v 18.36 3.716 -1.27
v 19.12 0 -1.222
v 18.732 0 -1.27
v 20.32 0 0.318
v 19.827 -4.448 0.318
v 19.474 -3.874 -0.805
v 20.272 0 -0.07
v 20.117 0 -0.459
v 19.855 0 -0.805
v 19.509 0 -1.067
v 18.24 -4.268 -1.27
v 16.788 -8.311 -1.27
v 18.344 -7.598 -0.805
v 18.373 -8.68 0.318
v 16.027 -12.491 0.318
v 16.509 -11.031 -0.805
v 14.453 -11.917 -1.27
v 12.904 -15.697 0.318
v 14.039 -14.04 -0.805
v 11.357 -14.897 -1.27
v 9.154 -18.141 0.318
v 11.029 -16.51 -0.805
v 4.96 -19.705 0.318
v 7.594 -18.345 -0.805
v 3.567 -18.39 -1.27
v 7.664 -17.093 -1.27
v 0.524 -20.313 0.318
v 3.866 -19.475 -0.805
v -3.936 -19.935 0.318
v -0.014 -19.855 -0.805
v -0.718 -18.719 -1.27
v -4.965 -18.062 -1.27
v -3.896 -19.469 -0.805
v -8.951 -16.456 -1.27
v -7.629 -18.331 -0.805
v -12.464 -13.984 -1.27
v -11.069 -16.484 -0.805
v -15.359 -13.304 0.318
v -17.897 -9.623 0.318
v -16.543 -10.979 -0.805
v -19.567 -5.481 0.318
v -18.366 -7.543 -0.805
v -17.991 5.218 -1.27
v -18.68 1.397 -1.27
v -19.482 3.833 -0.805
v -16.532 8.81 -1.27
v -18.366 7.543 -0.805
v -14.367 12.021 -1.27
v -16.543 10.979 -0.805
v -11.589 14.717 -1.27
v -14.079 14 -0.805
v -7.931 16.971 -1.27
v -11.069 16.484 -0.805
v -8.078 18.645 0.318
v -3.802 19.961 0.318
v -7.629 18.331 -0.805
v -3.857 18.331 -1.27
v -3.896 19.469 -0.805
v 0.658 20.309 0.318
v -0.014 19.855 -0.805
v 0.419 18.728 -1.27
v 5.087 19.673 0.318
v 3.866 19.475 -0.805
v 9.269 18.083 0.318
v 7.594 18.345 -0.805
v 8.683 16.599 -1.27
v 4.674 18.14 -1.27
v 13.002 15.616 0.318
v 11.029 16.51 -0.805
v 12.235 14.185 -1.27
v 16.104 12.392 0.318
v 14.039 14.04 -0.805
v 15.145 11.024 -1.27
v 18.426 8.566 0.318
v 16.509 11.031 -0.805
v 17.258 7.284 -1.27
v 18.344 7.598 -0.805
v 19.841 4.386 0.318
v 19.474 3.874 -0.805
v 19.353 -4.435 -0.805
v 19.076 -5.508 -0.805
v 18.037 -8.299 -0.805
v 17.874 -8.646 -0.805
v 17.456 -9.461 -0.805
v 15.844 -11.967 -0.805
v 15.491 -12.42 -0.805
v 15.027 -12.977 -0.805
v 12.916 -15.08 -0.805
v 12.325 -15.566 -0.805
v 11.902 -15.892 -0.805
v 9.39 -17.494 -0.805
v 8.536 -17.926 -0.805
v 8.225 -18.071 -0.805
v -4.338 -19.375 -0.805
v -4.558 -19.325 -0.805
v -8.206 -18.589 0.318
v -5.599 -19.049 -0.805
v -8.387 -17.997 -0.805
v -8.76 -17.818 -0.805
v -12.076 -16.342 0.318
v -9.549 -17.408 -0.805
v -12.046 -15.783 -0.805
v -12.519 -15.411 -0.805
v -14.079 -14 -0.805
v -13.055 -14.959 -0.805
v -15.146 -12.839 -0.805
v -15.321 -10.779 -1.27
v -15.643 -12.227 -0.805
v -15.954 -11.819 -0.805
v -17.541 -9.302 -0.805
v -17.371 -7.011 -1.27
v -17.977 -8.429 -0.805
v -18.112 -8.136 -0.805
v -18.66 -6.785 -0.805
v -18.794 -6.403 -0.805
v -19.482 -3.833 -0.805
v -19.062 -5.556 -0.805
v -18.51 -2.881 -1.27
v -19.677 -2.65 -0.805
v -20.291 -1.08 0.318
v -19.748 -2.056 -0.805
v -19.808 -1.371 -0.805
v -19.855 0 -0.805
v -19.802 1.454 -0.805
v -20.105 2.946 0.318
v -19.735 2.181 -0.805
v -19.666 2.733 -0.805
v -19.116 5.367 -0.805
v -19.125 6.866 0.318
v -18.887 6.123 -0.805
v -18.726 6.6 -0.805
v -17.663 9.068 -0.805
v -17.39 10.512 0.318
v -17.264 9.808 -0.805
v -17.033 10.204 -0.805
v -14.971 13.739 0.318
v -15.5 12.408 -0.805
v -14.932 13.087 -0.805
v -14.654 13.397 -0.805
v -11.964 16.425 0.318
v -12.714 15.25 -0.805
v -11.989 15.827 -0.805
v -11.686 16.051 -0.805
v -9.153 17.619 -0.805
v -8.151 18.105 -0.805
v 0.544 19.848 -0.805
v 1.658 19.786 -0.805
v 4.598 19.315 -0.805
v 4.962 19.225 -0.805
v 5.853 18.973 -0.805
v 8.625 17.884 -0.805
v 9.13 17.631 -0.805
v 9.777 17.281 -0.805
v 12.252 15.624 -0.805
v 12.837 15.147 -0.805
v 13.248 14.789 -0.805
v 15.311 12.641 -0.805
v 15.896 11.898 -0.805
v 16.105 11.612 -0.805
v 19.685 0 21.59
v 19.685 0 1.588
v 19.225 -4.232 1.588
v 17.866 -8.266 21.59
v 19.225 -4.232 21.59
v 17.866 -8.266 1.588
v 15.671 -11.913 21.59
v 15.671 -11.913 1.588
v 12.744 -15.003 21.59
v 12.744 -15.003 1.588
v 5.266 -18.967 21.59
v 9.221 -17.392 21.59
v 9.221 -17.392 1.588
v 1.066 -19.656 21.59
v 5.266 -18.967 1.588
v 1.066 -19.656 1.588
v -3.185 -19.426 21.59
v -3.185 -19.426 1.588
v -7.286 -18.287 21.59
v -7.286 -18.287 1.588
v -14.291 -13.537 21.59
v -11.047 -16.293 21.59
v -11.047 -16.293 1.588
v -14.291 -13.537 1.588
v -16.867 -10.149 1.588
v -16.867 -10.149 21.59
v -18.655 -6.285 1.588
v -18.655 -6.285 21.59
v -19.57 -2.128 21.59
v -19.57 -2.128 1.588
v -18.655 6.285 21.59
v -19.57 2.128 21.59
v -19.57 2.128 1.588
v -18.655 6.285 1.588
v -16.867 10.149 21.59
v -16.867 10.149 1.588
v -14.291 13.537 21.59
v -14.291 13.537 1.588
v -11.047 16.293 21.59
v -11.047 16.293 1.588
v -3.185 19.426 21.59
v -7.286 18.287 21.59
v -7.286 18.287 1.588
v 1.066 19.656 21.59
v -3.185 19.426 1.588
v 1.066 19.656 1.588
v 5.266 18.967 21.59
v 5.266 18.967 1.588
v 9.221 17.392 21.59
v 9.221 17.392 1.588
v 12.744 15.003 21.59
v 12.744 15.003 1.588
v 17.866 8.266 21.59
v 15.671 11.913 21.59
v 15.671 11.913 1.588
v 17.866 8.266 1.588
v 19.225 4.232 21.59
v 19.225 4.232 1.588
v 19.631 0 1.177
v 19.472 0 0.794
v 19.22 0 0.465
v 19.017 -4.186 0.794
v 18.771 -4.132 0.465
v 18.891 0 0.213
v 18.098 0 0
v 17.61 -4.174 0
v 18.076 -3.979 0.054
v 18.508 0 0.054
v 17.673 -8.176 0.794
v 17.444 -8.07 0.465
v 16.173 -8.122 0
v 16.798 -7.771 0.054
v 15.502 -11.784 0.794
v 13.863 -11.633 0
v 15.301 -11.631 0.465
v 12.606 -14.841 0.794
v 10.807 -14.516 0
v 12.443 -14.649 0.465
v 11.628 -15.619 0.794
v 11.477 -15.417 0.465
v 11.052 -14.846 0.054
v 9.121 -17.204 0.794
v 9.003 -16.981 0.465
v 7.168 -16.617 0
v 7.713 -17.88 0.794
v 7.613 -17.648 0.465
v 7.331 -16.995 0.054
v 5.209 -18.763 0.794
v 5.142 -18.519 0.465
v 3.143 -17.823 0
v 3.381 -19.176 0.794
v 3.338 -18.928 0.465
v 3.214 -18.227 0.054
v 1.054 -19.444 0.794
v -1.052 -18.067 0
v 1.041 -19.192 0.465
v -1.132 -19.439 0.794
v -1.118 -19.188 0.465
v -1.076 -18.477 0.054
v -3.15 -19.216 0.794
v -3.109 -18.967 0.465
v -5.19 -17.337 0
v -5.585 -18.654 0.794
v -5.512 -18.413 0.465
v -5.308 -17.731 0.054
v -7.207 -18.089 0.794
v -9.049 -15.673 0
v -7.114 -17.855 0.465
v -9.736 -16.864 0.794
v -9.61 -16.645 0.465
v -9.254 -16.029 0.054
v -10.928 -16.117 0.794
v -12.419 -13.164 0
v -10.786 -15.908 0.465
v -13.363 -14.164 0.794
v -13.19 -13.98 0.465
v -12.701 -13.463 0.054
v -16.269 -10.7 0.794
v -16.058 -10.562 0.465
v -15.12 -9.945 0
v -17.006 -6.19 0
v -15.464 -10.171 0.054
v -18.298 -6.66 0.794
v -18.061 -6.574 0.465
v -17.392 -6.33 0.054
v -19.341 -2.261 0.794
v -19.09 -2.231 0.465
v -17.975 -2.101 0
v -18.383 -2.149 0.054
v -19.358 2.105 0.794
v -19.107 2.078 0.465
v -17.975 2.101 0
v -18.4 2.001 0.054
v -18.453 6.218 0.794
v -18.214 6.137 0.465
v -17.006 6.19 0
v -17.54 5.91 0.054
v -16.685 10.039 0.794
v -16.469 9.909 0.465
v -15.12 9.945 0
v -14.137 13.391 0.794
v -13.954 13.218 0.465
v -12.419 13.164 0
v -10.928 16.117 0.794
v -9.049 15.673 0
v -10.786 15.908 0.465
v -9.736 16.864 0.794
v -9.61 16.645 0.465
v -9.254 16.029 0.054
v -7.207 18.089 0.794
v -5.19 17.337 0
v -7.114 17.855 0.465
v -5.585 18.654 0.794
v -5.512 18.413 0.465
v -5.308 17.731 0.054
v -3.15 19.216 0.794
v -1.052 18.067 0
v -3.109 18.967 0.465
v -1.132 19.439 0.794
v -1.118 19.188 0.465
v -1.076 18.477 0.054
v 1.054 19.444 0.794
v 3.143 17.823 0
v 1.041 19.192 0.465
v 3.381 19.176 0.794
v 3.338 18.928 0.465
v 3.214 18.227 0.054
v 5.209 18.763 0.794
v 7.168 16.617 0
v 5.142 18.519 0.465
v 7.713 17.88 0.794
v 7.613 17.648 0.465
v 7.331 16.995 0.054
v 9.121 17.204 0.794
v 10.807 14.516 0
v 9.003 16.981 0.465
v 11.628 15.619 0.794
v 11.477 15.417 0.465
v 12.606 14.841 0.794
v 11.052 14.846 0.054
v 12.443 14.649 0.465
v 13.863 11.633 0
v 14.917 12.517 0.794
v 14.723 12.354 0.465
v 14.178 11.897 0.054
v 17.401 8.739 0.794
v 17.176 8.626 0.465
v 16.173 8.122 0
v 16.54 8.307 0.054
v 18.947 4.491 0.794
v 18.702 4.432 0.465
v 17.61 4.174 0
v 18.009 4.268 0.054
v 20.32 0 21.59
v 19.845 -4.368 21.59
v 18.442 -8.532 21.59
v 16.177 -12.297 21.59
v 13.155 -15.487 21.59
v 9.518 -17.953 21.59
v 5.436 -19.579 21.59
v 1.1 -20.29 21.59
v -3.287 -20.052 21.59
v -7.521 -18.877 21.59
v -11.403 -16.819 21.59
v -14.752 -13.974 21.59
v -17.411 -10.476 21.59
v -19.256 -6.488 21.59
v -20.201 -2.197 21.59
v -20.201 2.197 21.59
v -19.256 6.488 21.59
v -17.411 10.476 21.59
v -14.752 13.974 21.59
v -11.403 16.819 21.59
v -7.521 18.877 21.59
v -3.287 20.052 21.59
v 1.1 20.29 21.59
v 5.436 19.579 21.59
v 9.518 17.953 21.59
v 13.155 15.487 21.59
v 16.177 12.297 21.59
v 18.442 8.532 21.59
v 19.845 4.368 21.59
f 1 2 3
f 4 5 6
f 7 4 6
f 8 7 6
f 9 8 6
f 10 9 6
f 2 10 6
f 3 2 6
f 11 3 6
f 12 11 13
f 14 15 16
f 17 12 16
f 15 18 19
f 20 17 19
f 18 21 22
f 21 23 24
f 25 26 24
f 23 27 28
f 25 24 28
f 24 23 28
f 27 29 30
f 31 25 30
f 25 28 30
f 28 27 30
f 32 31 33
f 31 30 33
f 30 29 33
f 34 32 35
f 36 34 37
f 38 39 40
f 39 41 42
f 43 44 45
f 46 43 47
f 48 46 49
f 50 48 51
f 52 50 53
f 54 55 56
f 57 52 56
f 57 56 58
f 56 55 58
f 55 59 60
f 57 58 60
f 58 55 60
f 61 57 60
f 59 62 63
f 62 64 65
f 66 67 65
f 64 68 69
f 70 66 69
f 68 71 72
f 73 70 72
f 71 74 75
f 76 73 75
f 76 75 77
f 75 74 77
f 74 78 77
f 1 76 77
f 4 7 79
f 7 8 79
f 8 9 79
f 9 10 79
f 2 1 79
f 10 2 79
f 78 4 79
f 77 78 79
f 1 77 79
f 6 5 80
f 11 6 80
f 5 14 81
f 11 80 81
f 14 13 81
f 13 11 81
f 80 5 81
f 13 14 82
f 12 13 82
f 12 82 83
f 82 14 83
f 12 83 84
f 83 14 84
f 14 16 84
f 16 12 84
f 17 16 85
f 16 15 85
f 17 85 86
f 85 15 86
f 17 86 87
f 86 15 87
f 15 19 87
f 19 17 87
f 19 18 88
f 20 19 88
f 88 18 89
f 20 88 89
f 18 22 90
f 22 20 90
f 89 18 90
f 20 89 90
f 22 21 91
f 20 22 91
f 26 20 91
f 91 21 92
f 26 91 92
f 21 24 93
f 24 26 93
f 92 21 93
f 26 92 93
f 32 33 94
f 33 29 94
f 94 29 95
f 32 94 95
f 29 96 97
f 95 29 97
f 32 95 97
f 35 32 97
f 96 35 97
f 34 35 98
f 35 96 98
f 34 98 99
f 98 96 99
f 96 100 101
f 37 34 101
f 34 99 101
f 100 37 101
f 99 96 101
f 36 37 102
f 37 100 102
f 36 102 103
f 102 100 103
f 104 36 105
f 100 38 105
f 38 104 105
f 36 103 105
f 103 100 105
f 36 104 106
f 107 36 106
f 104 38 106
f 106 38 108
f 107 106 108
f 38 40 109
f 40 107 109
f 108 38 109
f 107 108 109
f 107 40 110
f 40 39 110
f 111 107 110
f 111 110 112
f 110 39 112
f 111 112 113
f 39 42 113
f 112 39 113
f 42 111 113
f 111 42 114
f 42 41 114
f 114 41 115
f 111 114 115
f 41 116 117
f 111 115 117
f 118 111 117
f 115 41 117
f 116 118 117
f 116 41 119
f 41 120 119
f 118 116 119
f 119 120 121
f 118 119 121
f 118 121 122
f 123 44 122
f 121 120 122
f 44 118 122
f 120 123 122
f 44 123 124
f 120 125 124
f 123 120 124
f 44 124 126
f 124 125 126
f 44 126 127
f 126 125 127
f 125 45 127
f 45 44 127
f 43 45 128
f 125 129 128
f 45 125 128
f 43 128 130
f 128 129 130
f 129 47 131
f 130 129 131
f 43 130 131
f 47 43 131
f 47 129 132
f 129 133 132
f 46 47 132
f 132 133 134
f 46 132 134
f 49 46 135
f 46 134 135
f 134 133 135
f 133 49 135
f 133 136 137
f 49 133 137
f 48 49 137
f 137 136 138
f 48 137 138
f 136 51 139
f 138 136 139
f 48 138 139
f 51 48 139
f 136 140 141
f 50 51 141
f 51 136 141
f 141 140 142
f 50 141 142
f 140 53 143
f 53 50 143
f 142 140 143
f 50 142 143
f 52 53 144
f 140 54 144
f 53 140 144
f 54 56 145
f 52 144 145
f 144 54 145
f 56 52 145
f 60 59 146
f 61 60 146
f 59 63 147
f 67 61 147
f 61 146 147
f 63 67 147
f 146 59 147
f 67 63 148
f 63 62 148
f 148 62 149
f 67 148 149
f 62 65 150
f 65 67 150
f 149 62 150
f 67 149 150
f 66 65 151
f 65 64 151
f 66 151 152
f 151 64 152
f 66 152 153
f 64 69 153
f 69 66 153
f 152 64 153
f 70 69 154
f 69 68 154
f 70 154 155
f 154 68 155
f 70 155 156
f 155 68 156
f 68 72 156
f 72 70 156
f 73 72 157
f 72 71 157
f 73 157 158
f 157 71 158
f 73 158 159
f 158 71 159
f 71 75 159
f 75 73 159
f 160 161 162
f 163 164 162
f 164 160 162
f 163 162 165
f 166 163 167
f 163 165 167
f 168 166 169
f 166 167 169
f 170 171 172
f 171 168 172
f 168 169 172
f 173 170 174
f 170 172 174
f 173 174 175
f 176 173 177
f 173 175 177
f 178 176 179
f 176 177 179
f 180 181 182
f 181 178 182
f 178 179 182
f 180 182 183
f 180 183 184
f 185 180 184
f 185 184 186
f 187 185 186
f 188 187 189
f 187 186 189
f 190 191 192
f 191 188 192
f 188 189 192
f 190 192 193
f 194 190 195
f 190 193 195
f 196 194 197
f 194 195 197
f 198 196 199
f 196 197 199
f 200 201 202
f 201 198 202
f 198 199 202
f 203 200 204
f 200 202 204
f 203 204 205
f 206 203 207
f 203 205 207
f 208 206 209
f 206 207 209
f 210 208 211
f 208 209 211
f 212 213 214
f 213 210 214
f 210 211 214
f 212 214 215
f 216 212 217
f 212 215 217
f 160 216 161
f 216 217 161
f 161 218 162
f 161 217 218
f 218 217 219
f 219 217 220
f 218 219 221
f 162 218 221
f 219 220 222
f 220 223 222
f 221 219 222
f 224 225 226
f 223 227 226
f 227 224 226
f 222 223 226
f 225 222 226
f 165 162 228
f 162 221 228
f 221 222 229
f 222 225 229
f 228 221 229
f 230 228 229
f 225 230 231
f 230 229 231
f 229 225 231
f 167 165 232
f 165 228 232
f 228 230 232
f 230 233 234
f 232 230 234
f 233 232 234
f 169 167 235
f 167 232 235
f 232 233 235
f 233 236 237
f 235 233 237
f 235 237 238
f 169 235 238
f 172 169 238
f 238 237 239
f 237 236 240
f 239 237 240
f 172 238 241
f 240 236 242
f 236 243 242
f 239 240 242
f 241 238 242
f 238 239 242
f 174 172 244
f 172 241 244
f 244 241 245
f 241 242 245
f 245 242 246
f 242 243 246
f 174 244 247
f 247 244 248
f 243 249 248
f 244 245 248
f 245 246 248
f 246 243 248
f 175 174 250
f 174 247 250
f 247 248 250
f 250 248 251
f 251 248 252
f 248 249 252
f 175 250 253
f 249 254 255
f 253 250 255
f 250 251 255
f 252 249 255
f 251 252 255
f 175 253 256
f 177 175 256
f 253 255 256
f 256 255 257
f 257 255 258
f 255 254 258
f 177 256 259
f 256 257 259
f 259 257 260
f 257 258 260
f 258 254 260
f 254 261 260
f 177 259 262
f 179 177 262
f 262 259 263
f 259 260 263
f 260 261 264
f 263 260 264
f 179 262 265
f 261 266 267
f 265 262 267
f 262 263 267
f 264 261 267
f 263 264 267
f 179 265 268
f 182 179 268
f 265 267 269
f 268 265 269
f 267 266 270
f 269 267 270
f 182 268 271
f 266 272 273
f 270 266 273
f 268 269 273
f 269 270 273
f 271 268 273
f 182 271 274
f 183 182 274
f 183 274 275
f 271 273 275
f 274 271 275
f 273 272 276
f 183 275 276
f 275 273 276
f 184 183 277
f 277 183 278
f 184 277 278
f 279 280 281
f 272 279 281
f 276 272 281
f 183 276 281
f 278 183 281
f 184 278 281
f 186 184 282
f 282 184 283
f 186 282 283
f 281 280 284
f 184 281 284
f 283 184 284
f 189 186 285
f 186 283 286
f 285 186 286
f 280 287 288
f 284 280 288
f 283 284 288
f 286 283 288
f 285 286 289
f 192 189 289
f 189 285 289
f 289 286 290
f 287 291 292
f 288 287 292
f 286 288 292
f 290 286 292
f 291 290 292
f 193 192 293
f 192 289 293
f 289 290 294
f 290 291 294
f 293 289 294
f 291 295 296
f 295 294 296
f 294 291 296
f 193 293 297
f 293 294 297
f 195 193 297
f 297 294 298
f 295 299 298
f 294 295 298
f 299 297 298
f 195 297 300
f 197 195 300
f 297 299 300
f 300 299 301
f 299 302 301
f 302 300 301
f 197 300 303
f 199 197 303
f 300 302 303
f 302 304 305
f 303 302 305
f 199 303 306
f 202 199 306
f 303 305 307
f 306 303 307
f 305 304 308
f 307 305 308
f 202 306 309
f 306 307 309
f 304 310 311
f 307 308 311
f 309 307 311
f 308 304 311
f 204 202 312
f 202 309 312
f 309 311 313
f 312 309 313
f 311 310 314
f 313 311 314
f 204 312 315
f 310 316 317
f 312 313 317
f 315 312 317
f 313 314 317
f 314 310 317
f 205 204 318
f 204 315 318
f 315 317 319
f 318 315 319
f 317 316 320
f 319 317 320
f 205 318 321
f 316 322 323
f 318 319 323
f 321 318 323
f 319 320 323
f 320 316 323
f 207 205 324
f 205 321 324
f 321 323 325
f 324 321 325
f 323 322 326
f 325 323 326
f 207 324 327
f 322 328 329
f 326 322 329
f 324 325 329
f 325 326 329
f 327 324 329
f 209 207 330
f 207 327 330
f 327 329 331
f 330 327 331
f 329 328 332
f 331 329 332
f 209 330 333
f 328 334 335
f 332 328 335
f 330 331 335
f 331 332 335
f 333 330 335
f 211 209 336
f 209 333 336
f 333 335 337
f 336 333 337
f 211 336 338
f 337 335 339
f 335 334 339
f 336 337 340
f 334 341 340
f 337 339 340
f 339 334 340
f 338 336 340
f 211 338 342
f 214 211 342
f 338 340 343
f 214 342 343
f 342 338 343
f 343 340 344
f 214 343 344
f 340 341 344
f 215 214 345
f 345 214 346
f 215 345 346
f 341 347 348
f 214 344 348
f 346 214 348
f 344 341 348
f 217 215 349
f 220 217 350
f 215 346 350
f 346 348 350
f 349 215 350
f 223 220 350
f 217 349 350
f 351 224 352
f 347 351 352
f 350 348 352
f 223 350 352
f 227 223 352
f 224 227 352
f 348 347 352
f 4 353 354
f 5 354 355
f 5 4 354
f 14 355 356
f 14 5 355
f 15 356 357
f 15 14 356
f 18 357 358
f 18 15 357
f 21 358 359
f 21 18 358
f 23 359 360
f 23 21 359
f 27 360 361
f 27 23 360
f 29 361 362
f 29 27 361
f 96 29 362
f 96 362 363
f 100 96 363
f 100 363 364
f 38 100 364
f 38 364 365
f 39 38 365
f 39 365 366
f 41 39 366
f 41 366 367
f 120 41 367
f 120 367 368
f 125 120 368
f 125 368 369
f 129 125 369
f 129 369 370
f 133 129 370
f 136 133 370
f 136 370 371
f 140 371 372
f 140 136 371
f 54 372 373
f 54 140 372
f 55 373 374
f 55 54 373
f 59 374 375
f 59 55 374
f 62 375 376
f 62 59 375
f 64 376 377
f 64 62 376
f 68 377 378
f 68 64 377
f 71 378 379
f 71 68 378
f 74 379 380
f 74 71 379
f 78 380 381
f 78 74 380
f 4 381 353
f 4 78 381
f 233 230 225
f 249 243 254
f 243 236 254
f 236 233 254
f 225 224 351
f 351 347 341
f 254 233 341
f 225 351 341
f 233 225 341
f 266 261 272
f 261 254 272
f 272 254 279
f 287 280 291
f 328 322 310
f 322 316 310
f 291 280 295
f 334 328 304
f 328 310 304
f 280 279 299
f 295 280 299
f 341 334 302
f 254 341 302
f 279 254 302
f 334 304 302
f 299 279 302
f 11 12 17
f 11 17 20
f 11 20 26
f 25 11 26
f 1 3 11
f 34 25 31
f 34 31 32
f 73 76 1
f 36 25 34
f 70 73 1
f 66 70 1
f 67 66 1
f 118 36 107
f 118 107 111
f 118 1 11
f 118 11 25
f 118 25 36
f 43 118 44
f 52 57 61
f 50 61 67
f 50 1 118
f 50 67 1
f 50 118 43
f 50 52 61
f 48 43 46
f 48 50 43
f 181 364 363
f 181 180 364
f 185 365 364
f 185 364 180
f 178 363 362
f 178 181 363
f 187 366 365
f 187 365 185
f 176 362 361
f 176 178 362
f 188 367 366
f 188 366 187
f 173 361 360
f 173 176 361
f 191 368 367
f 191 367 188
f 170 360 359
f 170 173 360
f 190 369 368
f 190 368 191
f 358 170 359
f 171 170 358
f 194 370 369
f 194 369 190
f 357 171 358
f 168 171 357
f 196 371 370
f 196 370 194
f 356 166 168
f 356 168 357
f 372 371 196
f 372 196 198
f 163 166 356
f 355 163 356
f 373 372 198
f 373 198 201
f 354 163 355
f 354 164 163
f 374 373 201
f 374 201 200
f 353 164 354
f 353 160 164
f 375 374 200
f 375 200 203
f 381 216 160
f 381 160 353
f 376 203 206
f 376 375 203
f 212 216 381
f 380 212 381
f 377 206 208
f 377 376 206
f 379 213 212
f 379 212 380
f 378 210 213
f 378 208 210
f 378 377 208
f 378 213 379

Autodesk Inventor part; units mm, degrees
ref_plane "YZ Plane" through (0, 0, 0) normal (1, 0, 0) x (0, 1, 0)
ref_plane "XZ Plane" through (0, 0, 0) normal (0, 1, 0) x (-1, 0, 0)
ref_plane "XY Plane" through (0, 0, 0) normal (0, 0, 1) x (1, 0, 0)
sketch "Sketch1" plane through (0, 0, 0) normal (0, 0, 1) x (1, 0, 0)
  circle A0 centre (0, 0) radius 20.32
  circle A1 centre (0, 0) radius 19.685
  dimension "d0" = 40.64
  dimension "d1" = 39.37
extrude "Extrusion1" add sketch "Sketch1" along normal blind 21.59
sketch "Sketch2" plane through (0, 0, 0) normal (0, 0, -1) x (-1, 0, 0)
  circle A0 centre (0, 0) radius 20.32 projected
extrude "Extrusion2" add sketch "Sketch2" along normal blind 1.27
fillet "Fillet1" radius 1.5875 2 edges at (20.32, 0, -1.27) (-19.685, 0, 0)
properties part number "PSI Gauge Base 1764"
